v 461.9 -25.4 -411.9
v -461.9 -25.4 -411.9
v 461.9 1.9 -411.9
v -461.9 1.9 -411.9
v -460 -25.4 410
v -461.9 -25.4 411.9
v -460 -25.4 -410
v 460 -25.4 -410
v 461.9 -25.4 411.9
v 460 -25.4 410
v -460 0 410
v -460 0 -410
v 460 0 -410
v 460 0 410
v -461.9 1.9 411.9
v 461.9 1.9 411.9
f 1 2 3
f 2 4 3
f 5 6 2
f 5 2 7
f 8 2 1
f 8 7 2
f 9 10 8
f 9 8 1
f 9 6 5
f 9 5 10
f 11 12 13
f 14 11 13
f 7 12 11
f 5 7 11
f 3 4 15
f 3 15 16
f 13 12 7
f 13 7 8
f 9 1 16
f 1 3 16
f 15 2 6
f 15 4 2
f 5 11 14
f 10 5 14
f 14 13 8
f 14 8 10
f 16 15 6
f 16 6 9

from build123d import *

# Parameters (mm, degrees)
CROQUIS1_W              = 923.8
CROQUIS1_H              = 823.8
SALIENTE_EXTRUIR1_DEPTH = 1.9
CROQUIS2_W              = 923.8
CROQUIS2_H              = 823.8
CROQUIS2_W_2            = 920
CROQUIS2_H_2            = 820
SALIENTE_EXTRUIR2_DEPTH = 25.4


with BuildPart() as part:
    # Croquis1 → Saliente-Extruir1 (new body)
    with BuildSketch(Plane(origin=(0, 0, 0), x_dir=(1, 0, 0), z_dir=(0, 1, 0))):
        Rectangle(CROQUIS1_W, CROQUIS1_H)
    extrude(amount=SALIENTE_EXTRUIR1_DEPTH)

    # Croquis2 → Saliente-Extruir2 (add)
    with BuildSketch(Plane.XZ):
        Rectangle(CROQUIS2_W, CROQUIS2_H)
        Rectangle(CROQUIS2_W_2, CROQUIS2_H_2, mode=Mode.SUBTRACT)
    extrude(amount=SALIENTE_EXTRUIR2_DEPTH)


solid = part.part
